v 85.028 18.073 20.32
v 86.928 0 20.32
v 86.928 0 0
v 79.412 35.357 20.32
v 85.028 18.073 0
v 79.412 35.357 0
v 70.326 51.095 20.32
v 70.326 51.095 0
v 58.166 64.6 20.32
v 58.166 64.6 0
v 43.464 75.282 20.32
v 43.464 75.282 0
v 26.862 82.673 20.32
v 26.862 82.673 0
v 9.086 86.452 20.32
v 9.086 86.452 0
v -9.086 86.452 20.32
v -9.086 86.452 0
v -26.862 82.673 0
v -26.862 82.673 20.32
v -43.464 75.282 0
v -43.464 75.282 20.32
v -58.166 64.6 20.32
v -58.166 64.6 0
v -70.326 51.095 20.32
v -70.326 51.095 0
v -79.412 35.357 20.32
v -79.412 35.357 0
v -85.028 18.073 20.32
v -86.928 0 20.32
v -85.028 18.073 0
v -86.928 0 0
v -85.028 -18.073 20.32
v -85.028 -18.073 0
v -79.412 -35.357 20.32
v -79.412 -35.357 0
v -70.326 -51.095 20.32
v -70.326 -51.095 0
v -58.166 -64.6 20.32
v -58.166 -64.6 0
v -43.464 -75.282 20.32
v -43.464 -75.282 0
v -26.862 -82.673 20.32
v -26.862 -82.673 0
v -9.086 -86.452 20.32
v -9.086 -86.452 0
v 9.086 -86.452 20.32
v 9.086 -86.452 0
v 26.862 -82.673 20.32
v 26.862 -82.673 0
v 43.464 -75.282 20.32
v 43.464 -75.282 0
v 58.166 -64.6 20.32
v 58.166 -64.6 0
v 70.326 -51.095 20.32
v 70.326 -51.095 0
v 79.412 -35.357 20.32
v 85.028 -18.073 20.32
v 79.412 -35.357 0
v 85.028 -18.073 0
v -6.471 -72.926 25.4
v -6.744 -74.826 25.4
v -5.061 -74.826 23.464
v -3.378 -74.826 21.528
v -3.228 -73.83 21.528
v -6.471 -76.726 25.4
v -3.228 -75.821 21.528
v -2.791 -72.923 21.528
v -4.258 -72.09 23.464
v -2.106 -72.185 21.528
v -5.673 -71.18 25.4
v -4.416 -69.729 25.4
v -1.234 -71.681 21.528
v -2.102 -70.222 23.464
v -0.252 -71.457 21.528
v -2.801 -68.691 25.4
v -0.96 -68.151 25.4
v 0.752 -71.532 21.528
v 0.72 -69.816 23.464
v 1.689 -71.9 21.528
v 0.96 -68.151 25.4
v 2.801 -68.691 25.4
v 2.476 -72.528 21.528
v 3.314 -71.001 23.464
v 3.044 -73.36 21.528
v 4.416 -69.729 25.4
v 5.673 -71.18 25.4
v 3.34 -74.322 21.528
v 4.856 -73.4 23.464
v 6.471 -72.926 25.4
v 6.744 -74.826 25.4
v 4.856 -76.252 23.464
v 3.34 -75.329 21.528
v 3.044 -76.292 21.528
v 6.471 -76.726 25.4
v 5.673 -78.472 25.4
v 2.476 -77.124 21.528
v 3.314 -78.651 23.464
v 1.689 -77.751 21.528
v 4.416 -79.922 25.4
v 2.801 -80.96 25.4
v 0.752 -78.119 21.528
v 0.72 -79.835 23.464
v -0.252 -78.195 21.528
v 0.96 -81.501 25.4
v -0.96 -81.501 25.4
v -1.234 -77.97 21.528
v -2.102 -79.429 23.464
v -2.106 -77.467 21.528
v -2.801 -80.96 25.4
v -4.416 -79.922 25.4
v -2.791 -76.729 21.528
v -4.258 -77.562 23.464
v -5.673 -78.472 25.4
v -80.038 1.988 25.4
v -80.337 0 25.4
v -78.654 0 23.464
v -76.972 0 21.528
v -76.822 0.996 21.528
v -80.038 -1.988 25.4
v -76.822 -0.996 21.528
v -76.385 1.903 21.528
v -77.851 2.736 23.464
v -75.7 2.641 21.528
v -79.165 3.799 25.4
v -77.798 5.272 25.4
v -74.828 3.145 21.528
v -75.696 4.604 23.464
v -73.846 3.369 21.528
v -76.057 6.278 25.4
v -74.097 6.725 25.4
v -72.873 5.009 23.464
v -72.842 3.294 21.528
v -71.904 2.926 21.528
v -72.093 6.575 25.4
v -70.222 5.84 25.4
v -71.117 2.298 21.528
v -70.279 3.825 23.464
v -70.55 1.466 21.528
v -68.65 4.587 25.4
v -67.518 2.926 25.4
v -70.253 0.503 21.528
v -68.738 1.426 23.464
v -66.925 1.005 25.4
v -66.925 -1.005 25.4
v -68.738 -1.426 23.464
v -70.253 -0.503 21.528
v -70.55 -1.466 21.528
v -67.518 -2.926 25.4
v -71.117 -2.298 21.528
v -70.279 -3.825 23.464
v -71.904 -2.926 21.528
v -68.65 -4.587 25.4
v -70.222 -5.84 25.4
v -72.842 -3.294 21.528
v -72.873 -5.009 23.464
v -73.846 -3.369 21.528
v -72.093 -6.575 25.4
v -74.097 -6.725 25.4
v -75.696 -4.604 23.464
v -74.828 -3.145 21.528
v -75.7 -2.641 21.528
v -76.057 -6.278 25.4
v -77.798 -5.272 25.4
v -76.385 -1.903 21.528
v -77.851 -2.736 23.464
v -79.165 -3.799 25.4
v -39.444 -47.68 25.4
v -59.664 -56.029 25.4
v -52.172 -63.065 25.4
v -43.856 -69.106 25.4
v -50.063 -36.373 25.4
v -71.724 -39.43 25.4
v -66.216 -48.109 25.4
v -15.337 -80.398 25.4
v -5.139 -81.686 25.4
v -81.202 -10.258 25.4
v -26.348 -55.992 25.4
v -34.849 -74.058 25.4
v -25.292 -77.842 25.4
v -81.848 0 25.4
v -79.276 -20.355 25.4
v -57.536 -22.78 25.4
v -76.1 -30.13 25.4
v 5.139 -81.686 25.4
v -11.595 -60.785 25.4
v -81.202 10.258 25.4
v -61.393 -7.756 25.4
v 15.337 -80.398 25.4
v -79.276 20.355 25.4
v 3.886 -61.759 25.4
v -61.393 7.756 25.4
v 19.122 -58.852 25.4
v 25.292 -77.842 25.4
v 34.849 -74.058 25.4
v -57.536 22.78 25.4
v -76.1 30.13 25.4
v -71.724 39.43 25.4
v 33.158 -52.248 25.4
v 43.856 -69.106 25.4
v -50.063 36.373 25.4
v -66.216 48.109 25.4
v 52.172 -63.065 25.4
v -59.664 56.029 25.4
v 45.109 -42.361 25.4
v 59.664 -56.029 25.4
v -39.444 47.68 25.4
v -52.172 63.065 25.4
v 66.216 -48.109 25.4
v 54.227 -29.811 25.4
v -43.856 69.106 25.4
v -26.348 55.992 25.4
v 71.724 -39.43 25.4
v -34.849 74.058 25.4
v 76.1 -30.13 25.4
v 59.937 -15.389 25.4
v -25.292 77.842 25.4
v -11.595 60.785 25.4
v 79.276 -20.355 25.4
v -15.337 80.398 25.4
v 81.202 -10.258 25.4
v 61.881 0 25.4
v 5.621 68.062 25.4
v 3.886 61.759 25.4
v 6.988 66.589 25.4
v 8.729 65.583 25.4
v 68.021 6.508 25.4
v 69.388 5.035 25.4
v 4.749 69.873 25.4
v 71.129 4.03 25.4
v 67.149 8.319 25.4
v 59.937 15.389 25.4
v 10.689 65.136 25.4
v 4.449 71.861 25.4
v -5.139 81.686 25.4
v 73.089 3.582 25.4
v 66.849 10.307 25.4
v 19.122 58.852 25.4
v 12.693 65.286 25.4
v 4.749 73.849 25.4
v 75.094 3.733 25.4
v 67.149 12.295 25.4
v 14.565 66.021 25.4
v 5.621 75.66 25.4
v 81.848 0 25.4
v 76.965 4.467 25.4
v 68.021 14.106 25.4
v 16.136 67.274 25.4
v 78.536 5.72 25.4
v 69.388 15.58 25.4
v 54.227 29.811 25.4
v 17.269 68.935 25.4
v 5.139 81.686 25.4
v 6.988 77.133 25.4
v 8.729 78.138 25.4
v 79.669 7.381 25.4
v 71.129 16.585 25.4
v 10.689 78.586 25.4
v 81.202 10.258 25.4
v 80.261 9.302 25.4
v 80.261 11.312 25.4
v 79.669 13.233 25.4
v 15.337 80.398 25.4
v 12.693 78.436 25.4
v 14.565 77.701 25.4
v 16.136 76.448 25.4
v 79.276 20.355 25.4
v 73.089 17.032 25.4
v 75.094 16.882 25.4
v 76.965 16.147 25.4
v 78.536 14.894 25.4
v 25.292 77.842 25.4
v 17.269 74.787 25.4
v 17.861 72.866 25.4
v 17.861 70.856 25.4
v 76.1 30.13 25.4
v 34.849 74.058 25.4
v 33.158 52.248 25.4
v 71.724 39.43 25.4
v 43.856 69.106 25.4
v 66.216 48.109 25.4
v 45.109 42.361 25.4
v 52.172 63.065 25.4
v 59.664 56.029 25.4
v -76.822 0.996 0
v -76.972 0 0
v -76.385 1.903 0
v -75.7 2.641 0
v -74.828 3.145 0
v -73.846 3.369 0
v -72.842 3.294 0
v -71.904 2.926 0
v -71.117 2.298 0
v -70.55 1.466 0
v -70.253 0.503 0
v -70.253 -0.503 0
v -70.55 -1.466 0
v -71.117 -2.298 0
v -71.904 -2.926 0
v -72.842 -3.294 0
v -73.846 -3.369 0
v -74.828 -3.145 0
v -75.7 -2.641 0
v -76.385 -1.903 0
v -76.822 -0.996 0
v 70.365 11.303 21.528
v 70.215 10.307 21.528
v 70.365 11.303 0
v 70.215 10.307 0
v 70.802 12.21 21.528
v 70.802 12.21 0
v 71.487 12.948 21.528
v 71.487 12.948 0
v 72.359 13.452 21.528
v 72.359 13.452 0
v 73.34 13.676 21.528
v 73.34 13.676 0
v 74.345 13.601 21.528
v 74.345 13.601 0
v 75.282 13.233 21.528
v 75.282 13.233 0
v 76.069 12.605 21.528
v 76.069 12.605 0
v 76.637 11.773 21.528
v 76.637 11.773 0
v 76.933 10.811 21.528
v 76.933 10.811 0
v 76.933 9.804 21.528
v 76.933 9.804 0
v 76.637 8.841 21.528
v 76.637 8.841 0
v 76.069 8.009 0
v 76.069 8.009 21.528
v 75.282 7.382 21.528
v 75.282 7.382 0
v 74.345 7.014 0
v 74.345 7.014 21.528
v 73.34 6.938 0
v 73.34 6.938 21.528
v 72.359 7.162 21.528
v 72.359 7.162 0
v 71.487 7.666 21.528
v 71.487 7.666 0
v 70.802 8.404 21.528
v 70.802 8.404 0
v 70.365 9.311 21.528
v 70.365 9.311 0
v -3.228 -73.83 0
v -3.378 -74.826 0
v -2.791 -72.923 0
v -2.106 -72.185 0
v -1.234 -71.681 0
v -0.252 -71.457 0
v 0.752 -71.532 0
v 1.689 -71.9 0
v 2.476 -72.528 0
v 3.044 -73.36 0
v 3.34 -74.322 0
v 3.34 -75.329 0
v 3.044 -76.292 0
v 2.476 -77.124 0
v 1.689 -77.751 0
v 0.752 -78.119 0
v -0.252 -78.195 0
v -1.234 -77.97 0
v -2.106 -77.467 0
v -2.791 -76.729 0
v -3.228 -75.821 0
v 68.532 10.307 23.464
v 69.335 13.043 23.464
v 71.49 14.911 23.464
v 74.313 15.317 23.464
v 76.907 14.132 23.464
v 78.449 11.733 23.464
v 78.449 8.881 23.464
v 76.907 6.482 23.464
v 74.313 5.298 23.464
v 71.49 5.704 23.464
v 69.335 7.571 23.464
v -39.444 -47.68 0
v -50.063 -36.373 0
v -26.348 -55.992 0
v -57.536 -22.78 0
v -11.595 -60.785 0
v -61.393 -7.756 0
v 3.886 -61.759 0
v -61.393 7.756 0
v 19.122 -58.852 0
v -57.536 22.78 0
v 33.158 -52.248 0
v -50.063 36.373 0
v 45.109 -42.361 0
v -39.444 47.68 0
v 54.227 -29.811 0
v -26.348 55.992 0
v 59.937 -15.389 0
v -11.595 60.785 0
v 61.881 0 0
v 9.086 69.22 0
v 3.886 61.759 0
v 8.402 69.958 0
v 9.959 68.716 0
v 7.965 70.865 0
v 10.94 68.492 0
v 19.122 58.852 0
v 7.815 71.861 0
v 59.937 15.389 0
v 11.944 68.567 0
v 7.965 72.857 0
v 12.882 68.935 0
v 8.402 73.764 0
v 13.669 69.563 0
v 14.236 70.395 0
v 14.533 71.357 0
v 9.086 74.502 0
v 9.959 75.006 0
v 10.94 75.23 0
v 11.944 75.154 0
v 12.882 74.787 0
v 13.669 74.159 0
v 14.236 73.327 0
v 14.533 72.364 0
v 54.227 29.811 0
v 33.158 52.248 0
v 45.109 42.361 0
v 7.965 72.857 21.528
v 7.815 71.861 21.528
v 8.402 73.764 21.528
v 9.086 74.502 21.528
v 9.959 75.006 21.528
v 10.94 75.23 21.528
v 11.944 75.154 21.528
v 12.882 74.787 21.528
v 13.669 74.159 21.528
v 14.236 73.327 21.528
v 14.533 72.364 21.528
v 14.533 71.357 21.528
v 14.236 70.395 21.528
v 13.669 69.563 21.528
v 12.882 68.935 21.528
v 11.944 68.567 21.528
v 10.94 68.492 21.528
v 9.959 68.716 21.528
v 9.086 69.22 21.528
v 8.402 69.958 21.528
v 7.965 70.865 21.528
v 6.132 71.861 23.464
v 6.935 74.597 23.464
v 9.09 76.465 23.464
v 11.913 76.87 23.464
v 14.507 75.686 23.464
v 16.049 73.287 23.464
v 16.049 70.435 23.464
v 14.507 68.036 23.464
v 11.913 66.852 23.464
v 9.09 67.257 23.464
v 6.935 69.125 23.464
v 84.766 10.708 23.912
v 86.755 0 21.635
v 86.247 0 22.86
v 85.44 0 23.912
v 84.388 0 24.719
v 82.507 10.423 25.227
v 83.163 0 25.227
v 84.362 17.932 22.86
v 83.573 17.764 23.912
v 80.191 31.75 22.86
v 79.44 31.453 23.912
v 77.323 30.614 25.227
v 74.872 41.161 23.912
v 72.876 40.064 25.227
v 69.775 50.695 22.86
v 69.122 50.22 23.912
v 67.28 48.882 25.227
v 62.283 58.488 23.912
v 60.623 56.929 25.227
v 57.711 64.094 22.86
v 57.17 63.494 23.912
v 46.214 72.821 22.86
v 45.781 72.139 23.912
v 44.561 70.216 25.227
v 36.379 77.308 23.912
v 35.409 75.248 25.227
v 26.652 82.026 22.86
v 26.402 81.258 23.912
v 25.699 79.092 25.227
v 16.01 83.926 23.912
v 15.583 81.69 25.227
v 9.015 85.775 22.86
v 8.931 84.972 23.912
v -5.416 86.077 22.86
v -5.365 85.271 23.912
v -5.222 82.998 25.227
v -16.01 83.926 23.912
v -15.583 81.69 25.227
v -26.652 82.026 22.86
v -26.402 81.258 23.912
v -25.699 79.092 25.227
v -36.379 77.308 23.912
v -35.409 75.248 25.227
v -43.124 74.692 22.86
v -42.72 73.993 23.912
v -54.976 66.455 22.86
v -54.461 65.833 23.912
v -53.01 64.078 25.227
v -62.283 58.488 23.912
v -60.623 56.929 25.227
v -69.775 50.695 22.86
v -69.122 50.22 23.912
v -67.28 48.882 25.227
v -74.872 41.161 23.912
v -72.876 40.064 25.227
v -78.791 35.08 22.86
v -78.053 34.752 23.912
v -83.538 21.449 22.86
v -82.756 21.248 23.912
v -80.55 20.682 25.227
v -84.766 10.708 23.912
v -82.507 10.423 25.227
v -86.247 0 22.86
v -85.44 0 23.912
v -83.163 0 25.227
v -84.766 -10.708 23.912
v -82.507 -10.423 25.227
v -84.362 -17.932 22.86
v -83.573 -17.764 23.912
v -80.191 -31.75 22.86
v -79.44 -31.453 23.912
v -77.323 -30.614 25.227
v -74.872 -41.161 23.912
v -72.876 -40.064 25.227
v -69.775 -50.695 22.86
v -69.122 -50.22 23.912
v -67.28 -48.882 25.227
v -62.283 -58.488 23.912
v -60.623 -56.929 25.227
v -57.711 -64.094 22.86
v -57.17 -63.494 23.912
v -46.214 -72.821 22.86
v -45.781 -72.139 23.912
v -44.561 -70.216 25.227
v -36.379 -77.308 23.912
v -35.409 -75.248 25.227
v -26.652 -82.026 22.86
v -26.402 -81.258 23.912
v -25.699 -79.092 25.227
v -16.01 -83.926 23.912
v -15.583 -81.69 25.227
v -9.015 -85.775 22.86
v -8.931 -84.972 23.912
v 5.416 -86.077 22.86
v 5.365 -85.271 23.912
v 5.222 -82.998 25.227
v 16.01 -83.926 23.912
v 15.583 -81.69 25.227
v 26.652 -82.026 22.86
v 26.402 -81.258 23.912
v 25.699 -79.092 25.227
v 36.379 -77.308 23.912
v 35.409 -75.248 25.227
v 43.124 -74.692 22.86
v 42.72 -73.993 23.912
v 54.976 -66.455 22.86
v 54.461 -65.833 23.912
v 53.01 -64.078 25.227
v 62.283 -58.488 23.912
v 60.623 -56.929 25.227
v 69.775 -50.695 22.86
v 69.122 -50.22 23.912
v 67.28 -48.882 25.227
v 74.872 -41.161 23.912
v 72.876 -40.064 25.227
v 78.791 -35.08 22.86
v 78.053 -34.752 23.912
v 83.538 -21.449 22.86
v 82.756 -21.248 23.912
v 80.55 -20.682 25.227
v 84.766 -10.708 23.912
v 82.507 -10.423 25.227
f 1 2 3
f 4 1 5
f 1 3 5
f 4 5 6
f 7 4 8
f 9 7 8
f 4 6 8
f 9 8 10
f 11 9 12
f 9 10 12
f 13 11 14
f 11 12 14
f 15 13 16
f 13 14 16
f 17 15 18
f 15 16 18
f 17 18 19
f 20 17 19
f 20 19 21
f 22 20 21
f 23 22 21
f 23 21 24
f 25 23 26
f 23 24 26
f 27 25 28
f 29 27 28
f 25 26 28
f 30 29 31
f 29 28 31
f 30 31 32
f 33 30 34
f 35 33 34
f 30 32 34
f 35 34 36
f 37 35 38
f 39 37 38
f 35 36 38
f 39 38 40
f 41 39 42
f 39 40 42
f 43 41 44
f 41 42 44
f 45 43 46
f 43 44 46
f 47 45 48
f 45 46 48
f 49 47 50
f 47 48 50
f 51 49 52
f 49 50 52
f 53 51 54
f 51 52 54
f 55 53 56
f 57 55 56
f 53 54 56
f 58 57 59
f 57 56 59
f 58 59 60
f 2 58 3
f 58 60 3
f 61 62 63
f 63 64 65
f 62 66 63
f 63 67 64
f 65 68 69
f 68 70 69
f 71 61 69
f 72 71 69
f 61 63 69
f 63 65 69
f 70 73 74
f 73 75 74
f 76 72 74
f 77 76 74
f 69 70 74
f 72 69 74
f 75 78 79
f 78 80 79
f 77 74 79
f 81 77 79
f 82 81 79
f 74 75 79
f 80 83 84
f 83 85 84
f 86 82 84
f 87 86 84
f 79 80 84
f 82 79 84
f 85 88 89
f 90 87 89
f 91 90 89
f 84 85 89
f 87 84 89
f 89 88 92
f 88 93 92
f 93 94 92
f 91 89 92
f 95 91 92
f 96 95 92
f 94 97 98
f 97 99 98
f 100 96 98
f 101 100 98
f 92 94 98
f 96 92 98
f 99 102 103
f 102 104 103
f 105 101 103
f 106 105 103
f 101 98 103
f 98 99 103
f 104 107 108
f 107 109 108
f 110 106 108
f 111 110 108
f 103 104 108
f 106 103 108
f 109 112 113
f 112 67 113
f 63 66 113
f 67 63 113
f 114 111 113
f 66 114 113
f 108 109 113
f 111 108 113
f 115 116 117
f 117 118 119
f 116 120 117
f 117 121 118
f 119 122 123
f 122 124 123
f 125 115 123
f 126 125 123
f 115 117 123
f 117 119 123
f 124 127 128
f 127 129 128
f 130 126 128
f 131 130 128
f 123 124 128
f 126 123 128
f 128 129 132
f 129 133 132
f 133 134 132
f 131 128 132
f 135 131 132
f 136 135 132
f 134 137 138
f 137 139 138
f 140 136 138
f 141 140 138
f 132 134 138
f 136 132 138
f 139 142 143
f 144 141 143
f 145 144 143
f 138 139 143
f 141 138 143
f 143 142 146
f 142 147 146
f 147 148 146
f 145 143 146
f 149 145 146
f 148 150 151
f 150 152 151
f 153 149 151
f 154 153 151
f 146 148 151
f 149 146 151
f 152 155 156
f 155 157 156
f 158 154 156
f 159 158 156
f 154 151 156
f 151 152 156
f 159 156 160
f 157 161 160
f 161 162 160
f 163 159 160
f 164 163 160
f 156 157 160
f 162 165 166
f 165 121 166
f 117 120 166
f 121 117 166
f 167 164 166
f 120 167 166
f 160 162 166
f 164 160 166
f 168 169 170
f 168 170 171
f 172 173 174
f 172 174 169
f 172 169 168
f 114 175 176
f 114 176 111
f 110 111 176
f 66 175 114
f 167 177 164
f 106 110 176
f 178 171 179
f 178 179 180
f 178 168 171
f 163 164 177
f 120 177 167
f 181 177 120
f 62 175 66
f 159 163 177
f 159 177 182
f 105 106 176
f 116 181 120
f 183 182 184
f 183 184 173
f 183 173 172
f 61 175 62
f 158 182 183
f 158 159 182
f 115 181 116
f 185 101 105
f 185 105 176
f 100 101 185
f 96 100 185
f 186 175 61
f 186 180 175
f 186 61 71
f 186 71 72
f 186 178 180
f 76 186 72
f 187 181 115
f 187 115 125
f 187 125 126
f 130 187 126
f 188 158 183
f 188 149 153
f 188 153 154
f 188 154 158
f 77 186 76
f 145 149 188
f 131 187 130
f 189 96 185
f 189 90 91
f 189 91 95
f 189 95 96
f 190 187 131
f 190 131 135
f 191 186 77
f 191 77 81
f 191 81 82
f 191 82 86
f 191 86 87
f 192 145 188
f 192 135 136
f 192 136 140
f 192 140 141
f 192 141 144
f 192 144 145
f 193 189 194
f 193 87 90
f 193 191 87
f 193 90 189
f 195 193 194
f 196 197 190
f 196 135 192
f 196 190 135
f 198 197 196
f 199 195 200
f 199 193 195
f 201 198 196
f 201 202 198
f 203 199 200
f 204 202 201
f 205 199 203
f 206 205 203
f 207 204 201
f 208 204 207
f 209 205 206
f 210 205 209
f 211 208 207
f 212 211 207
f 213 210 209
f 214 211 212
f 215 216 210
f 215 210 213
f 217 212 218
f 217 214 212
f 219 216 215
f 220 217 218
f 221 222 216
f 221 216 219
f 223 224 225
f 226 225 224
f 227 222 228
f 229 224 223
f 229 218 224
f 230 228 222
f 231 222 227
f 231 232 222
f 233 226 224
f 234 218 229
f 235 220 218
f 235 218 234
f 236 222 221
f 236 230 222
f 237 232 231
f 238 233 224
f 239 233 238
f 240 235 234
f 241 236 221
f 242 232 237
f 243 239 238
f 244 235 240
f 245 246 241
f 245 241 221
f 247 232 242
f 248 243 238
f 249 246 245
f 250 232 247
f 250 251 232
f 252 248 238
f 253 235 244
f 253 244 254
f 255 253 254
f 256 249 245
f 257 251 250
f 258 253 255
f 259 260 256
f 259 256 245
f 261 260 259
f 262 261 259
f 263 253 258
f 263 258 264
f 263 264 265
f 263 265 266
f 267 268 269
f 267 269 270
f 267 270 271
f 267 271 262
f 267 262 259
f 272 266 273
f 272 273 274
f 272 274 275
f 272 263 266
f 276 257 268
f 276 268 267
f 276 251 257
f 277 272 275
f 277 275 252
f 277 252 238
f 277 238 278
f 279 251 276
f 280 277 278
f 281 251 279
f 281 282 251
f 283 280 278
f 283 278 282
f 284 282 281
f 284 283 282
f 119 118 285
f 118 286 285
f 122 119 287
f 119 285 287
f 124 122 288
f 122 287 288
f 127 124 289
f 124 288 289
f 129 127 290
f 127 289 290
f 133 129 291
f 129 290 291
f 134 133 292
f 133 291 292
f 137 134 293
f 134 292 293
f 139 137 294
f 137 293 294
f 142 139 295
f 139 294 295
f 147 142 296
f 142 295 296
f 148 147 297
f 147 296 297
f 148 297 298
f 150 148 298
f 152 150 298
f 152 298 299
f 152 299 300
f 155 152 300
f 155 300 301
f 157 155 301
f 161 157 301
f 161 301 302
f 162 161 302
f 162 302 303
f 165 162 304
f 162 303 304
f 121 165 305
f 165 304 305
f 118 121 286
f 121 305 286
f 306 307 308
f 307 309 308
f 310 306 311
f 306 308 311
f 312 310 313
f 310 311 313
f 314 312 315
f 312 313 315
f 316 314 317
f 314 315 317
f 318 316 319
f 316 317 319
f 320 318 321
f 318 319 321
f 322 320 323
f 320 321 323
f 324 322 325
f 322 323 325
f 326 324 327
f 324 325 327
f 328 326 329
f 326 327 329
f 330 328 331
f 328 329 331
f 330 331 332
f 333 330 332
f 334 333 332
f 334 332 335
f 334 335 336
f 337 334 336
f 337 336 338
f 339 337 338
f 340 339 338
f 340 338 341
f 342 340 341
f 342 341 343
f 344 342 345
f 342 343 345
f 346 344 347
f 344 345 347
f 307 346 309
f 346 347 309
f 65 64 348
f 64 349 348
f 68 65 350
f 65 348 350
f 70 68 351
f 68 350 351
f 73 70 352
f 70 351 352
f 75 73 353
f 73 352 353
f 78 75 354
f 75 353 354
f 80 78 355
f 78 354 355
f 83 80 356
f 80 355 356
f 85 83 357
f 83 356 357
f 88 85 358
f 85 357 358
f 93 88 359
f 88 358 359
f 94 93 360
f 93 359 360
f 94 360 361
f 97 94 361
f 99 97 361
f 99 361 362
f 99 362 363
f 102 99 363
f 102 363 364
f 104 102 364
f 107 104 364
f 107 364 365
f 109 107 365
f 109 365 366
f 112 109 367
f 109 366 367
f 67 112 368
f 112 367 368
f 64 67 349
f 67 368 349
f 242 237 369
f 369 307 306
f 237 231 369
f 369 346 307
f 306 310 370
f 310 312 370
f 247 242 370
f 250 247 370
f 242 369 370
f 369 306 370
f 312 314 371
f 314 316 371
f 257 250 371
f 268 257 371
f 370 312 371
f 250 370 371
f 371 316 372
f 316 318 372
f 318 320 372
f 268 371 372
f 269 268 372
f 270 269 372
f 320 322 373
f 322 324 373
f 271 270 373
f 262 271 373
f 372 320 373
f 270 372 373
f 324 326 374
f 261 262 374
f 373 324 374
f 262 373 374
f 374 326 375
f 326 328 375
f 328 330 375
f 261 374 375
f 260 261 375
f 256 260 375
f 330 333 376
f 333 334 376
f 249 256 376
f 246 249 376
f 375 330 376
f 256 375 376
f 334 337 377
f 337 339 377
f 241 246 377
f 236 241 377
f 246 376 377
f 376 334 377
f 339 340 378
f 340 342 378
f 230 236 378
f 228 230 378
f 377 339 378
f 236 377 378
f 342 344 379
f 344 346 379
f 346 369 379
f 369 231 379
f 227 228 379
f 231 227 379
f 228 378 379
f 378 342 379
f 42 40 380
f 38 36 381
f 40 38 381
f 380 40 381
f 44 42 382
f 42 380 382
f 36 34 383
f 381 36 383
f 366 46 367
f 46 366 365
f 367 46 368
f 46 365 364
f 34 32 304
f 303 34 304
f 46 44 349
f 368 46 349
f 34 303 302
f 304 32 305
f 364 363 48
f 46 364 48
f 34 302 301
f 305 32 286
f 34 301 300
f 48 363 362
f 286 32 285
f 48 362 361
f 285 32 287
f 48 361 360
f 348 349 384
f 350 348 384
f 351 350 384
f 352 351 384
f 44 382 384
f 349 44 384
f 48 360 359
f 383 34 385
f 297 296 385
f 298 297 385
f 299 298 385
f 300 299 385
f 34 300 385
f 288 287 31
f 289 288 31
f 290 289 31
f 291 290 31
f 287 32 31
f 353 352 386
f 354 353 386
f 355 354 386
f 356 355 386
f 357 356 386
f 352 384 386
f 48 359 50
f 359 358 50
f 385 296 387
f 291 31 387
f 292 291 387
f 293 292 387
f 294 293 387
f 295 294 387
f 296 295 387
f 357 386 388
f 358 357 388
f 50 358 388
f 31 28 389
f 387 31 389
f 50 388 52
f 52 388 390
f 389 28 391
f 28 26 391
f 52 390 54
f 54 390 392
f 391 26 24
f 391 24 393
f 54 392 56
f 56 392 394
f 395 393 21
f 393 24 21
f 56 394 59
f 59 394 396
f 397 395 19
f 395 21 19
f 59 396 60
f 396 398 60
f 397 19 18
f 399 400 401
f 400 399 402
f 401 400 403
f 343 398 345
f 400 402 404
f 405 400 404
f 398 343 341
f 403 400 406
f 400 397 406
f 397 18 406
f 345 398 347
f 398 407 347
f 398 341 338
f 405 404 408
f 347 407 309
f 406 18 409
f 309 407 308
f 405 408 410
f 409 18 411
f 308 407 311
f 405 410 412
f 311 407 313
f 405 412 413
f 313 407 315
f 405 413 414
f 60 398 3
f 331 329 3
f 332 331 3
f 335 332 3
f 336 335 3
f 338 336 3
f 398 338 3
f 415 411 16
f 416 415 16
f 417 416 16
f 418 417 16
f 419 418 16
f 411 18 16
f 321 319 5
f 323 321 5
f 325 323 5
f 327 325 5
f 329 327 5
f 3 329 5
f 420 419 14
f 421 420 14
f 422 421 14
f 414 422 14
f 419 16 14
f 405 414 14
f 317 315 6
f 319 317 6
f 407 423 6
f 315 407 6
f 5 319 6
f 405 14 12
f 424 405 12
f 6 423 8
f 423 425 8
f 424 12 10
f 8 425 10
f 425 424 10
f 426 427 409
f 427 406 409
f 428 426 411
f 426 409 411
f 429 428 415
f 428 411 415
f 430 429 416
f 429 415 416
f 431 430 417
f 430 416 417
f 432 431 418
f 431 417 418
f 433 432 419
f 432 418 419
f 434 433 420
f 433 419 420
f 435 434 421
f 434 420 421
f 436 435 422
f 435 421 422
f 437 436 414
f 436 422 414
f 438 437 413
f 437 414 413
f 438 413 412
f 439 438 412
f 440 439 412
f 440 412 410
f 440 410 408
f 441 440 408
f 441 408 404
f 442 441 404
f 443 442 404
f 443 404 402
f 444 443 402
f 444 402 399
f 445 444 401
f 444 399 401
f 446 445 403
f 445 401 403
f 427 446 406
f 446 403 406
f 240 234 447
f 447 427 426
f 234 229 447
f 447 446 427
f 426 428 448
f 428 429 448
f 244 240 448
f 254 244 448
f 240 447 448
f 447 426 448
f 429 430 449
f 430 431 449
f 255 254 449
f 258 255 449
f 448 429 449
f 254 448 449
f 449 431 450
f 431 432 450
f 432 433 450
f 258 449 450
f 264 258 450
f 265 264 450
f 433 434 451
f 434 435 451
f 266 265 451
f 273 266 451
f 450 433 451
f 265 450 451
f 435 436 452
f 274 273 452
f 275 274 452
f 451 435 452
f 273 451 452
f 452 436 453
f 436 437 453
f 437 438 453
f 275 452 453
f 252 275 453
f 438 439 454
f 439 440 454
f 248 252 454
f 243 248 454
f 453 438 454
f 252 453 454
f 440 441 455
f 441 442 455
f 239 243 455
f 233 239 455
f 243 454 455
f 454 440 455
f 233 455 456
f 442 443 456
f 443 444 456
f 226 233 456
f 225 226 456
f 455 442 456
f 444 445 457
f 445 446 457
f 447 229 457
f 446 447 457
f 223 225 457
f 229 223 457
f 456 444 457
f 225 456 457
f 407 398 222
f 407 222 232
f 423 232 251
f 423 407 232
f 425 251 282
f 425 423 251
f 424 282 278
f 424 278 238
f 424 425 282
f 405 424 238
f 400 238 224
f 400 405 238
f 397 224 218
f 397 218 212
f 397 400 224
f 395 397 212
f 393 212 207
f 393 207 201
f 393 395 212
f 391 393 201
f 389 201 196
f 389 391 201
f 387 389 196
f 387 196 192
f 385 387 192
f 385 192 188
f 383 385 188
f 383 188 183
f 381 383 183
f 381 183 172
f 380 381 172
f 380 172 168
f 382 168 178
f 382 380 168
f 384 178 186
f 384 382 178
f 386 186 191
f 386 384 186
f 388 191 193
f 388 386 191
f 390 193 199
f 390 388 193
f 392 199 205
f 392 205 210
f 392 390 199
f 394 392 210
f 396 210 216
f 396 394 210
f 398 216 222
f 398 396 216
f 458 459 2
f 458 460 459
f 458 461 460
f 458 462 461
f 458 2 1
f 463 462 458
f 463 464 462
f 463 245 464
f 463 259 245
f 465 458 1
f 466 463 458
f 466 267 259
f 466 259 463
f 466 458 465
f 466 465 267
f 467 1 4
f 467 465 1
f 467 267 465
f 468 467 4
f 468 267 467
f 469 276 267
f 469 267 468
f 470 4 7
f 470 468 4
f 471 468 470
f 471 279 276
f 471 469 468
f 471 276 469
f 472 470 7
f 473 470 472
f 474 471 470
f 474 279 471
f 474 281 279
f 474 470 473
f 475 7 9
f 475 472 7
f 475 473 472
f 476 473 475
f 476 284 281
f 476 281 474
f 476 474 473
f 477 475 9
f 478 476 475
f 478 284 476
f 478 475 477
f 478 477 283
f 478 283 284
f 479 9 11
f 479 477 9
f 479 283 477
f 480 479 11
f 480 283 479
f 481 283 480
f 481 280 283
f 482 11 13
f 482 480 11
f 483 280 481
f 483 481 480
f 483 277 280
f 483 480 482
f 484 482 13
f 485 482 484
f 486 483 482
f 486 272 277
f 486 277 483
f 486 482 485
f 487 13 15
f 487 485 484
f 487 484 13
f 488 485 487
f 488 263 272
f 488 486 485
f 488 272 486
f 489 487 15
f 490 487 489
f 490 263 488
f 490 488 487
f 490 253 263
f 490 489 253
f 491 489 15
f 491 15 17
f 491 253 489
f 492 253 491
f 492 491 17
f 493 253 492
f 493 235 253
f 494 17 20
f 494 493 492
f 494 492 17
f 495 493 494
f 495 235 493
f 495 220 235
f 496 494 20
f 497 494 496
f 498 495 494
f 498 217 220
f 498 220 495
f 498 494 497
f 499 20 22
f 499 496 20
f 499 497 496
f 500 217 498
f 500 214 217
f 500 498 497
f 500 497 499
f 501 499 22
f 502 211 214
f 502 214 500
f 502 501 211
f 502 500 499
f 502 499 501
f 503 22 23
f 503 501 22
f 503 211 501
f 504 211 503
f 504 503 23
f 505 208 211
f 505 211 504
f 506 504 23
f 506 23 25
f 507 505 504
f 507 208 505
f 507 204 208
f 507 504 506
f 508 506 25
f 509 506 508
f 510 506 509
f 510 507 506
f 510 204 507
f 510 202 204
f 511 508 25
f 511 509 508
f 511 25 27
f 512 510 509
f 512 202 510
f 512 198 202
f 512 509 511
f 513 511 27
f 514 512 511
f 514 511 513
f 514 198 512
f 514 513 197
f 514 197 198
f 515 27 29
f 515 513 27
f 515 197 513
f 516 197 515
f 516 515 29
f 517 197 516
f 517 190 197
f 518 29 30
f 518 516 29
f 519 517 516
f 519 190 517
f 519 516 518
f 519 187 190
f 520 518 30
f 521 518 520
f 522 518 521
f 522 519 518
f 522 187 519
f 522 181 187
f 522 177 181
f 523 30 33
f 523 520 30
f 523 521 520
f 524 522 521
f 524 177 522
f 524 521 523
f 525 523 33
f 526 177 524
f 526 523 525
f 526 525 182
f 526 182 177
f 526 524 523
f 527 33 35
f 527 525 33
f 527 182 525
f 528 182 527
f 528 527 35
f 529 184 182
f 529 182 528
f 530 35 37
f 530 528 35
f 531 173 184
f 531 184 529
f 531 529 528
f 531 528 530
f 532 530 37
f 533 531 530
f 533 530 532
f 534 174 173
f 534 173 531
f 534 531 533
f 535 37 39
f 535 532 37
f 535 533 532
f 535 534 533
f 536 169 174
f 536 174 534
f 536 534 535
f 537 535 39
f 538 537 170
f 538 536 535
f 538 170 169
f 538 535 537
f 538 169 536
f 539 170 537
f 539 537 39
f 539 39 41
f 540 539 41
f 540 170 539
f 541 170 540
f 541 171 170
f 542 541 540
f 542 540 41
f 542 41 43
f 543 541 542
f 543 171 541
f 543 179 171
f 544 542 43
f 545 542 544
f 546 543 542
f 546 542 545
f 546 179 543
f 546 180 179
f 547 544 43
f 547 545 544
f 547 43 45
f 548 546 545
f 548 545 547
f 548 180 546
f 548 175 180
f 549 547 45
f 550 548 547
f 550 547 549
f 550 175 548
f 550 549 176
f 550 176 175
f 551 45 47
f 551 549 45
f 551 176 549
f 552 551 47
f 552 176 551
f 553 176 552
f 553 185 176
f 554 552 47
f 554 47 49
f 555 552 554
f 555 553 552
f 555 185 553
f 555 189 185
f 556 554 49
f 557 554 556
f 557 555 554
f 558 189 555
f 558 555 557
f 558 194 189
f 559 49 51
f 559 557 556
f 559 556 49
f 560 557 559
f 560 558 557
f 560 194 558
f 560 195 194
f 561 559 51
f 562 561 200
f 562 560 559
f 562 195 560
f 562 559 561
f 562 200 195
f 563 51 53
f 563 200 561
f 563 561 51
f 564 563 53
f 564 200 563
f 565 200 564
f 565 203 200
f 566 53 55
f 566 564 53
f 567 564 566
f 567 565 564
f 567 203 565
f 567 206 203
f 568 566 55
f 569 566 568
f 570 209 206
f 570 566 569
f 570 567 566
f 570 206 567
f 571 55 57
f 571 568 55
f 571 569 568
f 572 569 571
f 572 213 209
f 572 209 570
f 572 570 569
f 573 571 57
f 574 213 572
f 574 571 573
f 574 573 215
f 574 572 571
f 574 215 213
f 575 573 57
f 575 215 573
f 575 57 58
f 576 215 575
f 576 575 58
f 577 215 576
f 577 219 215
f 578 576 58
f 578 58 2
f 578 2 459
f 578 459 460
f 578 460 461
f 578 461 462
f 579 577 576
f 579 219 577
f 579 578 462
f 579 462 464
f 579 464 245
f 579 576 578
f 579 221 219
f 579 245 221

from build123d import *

# Parameters (mm, degrees)
F0_R           = 86.927765
F0_R_2         = 61.88106
F1_DEPTH       = 25.4
F3_D           = 6.7564
F3_CSINK_D     = 13.4874
F3_CSINK_ANGLE = 82
F4_R           = 5.08


with BuildPart() as f1:
    # F0 (on Top) → F1 (new body)
    with BuildSketch(Plane.XY):
        Circle(F0_R)
        Circle(F0_R_2, mode=Mode.SUBTRACT)
    extrude(amount=F1_DEPTH)

    # F3 (through all)
    with Locations(Plane.XY.offset(25.4)):
        with Locations((-73.593527, 0), (0, -74.825756), (73.592886, 10.307162), (11.192732, 71.860947)):
            CounterSinkHole(F3_D / 2, F3_CSINK_D / 2, counter_sink_angle=F3_CSINK_ANGLE)

    # F4
    f4_edges = [f1.edges().sort_by_distance(p)[0] for p in [
        (-86.927765, 0, 25.4),
    ]]
    fillet(f4_edges, radius=F4_R)


solid = f1.part
